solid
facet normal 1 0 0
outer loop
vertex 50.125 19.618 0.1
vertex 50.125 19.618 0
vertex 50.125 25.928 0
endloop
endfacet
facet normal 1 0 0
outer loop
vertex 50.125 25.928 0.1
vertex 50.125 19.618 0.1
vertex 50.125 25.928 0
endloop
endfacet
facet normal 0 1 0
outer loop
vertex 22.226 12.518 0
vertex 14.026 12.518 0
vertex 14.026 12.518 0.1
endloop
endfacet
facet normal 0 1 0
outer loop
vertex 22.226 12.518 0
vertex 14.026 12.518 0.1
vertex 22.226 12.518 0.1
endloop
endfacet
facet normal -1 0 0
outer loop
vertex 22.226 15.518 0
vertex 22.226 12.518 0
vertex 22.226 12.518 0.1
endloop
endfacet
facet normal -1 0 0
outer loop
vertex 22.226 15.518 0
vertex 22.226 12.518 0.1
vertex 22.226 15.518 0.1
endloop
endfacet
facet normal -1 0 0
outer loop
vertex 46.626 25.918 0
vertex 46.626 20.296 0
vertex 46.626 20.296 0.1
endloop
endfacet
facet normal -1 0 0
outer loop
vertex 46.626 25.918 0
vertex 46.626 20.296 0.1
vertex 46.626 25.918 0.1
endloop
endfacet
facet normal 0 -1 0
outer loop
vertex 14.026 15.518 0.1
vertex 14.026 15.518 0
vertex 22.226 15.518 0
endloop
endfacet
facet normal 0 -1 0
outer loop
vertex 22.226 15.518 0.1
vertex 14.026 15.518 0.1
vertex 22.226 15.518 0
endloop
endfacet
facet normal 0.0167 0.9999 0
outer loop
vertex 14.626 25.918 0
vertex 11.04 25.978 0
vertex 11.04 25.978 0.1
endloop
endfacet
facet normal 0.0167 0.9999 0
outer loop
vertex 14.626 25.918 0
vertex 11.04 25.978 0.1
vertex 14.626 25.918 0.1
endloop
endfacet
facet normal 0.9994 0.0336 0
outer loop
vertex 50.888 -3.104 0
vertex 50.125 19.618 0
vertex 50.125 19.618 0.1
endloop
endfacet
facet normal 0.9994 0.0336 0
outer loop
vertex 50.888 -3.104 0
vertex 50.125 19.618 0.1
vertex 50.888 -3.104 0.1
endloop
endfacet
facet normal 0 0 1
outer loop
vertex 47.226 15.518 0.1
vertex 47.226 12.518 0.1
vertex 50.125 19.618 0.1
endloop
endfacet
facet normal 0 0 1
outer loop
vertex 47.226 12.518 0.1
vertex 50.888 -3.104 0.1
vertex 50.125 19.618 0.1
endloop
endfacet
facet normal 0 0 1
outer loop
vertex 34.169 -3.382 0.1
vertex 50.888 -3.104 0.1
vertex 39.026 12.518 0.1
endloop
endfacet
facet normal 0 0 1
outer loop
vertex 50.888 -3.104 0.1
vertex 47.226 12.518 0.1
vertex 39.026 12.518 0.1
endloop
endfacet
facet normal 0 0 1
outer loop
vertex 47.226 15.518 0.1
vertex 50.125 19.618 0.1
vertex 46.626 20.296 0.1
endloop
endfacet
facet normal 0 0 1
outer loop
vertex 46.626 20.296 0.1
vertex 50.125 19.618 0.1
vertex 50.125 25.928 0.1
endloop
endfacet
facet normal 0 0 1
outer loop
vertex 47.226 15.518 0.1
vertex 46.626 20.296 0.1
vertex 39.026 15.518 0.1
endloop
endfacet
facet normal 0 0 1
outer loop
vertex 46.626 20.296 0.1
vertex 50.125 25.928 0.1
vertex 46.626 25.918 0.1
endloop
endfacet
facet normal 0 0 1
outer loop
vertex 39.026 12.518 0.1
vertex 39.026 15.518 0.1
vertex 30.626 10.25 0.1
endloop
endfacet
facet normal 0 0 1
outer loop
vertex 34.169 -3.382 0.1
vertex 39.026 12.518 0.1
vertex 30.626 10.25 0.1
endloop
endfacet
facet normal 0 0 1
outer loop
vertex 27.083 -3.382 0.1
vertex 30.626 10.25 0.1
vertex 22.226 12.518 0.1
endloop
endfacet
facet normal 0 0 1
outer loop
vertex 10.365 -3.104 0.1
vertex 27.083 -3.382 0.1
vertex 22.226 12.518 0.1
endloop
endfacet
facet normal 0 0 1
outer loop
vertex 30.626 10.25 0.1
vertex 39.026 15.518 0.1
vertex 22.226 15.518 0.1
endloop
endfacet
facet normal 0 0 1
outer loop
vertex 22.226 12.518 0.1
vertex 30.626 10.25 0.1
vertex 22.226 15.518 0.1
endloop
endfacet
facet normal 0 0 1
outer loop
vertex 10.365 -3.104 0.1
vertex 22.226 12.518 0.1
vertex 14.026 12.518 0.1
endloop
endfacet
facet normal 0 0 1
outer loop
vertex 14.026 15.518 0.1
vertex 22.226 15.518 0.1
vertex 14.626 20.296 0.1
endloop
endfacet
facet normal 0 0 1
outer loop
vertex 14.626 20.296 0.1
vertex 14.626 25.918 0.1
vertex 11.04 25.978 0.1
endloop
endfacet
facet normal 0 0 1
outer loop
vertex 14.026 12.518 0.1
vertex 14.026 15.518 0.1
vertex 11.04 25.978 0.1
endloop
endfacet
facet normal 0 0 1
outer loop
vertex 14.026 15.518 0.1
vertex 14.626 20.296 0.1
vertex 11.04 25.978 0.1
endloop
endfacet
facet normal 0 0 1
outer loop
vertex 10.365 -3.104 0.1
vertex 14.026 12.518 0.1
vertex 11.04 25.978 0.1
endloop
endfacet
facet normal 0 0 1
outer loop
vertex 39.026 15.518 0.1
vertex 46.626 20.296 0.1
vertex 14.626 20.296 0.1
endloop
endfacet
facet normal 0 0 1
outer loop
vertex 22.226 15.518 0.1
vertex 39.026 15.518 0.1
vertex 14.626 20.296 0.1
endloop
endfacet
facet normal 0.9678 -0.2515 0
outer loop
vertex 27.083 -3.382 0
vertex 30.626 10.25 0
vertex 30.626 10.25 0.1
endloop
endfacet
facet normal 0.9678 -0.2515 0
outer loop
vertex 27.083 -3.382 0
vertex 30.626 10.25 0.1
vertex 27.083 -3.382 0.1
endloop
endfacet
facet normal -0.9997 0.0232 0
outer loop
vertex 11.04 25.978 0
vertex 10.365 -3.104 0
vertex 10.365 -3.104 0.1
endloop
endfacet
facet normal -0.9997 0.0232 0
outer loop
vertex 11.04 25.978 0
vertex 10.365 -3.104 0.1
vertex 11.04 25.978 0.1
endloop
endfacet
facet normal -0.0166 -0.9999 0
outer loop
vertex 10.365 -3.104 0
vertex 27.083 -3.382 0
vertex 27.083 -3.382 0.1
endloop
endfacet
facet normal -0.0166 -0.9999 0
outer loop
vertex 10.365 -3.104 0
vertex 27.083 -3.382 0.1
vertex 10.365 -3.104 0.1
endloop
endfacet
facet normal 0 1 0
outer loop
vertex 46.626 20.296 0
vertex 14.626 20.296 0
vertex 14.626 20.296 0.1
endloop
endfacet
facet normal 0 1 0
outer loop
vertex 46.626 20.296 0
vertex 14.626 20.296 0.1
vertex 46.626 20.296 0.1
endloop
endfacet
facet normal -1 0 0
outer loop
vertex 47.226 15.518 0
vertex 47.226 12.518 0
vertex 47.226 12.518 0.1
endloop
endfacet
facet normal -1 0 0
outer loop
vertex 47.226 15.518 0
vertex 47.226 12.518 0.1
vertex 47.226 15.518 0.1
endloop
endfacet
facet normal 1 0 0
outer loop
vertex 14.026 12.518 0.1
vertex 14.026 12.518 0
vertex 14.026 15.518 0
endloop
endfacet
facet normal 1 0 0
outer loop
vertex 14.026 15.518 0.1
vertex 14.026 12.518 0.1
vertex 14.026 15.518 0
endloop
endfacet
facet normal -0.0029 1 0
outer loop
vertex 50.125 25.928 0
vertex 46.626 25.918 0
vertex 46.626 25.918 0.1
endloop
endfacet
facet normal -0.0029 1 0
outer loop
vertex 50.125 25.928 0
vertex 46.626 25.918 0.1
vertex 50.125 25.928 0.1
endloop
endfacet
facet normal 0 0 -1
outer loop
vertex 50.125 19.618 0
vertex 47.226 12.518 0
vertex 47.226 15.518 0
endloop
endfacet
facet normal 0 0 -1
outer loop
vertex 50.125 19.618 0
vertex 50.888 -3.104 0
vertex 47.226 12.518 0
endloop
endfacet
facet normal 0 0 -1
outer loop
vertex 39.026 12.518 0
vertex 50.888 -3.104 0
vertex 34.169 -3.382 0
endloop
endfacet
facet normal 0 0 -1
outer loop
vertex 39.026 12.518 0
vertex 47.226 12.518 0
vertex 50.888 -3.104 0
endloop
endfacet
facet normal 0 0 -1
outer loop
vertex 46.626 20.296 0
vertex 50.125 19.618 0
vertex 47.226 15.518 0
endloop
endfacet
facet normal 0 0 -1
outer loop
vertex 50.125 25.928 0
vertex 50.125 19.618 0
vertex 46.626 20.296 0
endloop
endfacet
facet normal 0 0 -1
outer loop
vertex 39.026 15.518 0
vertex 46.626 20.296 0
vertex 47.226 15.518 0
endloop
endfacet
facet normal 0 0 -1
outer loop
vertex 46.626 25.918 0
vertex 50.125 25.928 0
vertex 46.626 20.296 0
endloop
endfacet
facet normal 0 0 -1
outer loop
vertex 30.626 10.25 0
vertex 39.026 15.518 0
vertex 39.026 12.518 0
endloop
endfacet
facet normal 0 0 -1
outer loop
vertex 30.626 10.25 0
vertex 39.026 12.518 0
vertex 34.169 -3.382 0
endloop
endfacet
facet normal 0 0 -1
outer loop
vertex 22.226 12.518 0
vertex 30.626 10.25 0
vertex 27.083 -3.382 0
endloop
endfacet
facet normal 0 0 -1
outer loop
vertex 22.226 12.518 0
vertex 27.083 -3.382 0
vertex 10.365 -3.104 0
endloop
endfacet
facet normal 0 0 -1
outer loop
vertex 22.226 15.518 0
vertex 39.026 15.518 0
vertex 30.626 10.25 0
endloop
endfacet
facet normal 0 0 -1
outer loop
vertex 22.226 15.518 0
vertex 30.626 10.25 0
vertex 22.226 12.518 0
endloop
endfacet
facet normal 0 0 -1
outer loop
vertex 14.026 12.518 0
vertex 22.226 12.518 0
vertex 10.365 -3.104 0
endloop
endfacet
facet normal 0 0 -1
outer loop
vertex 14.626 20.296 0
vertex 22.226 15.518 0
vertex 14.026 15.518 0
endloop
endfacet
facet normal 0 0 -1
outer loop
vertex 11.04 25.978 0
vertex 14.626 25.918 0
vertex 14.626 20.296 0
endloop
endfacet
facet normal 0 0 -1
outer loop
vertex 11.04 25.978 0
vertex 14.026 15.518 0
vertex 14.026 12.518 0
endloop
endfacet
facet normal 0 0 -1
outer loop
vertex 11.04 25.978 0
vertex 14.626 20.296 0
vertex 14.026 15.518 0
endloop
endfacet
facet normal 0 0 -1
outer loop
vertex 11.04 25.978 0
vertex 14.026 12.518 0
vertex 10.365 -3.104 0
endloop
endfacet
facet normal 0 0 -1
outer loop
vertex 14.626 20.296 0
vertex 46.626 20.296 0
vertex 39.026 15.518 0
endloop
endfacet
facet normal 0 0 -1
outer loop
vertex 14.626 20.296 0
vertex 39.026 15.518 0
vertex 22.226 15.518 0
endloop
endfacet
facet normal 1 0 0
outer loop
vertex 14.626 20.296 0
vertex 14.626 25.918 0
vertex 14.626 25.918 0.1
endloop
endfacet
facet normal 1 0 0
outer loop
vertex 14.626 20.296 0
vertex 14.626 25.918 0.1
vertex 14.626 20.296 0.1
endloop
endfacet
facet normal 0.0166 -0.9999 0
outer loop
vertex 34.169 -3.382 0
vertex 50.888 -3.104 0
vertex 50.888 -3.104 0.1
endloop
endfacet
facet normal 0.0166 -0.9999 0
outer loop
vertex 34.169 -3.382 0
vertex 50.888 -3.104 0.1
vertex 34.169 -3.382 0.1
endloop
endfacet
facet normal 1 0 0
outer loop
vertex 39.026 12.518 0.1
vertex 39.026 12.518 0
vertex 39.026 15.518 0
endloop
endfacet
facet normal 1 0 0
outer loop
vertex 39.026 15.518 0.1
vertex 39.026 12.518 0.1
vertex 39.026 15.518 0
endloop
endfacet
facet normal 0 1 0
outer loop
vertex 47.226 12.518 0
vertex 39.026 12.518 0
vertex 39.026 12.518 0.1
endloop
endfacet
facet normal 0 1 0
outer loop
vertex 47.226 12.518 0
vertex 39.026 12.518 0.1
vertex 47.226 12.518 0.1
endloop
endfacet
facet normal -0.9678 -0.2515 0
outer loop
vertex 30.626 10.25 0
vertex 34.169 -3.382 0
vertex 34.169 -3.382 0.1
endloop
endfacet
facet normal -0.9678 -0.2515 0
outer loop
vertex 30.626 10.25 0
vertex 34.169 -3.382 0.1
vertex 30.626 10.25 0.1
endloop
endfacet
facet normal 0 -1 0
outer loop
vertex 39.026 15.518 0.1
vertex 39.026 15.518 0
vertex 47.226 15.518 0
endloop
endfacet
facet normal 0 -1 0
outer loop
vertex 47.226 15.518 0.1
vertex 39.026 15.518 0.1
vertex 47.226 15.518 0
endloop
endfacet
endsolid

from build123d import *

# Parameters (mm, degrees)
MODEL_W                 = 8.2
MODEL_H                 = 3
SALIENTE_EXTRUIR1_DEPTH = 0.1


with BuildPart() as part:
    # Model → Saliente-Extruir1 (new body)
    with BuildSketch(Plane.XY):
        Polygon((50.124922154, 24.617645317), (50.124922154, 19.617645317), (50.887641035, -3.103510086), (34.169357615, -3.381657238), (30.626179611, 10.250358005), (27.083001606, -3.381657238), (10.364718187, -3.103510086), (11.040374185, 25.978480921), (14.626179611, 25.917645317), (14.626179611, 20.295679334), (46.626179611, 20.295679334), (46.626179611, 25.917645317), (50.124922154, 25.9284032), align=None)
        with Locations((18.126179611, 14.017645317)):
            Rectangle(MODEL_W, MODEL_H, mode=Mode.SUBTRACT)
        with Locations((43.126179611, 14.017645317)):
            Rectangle(MODEL_W, MODEL_H, mode=Mode.SUBTRACT)
    extrude(amount=SALIENTE_EXTRUIR1_DEPTH)


solid = part.part
